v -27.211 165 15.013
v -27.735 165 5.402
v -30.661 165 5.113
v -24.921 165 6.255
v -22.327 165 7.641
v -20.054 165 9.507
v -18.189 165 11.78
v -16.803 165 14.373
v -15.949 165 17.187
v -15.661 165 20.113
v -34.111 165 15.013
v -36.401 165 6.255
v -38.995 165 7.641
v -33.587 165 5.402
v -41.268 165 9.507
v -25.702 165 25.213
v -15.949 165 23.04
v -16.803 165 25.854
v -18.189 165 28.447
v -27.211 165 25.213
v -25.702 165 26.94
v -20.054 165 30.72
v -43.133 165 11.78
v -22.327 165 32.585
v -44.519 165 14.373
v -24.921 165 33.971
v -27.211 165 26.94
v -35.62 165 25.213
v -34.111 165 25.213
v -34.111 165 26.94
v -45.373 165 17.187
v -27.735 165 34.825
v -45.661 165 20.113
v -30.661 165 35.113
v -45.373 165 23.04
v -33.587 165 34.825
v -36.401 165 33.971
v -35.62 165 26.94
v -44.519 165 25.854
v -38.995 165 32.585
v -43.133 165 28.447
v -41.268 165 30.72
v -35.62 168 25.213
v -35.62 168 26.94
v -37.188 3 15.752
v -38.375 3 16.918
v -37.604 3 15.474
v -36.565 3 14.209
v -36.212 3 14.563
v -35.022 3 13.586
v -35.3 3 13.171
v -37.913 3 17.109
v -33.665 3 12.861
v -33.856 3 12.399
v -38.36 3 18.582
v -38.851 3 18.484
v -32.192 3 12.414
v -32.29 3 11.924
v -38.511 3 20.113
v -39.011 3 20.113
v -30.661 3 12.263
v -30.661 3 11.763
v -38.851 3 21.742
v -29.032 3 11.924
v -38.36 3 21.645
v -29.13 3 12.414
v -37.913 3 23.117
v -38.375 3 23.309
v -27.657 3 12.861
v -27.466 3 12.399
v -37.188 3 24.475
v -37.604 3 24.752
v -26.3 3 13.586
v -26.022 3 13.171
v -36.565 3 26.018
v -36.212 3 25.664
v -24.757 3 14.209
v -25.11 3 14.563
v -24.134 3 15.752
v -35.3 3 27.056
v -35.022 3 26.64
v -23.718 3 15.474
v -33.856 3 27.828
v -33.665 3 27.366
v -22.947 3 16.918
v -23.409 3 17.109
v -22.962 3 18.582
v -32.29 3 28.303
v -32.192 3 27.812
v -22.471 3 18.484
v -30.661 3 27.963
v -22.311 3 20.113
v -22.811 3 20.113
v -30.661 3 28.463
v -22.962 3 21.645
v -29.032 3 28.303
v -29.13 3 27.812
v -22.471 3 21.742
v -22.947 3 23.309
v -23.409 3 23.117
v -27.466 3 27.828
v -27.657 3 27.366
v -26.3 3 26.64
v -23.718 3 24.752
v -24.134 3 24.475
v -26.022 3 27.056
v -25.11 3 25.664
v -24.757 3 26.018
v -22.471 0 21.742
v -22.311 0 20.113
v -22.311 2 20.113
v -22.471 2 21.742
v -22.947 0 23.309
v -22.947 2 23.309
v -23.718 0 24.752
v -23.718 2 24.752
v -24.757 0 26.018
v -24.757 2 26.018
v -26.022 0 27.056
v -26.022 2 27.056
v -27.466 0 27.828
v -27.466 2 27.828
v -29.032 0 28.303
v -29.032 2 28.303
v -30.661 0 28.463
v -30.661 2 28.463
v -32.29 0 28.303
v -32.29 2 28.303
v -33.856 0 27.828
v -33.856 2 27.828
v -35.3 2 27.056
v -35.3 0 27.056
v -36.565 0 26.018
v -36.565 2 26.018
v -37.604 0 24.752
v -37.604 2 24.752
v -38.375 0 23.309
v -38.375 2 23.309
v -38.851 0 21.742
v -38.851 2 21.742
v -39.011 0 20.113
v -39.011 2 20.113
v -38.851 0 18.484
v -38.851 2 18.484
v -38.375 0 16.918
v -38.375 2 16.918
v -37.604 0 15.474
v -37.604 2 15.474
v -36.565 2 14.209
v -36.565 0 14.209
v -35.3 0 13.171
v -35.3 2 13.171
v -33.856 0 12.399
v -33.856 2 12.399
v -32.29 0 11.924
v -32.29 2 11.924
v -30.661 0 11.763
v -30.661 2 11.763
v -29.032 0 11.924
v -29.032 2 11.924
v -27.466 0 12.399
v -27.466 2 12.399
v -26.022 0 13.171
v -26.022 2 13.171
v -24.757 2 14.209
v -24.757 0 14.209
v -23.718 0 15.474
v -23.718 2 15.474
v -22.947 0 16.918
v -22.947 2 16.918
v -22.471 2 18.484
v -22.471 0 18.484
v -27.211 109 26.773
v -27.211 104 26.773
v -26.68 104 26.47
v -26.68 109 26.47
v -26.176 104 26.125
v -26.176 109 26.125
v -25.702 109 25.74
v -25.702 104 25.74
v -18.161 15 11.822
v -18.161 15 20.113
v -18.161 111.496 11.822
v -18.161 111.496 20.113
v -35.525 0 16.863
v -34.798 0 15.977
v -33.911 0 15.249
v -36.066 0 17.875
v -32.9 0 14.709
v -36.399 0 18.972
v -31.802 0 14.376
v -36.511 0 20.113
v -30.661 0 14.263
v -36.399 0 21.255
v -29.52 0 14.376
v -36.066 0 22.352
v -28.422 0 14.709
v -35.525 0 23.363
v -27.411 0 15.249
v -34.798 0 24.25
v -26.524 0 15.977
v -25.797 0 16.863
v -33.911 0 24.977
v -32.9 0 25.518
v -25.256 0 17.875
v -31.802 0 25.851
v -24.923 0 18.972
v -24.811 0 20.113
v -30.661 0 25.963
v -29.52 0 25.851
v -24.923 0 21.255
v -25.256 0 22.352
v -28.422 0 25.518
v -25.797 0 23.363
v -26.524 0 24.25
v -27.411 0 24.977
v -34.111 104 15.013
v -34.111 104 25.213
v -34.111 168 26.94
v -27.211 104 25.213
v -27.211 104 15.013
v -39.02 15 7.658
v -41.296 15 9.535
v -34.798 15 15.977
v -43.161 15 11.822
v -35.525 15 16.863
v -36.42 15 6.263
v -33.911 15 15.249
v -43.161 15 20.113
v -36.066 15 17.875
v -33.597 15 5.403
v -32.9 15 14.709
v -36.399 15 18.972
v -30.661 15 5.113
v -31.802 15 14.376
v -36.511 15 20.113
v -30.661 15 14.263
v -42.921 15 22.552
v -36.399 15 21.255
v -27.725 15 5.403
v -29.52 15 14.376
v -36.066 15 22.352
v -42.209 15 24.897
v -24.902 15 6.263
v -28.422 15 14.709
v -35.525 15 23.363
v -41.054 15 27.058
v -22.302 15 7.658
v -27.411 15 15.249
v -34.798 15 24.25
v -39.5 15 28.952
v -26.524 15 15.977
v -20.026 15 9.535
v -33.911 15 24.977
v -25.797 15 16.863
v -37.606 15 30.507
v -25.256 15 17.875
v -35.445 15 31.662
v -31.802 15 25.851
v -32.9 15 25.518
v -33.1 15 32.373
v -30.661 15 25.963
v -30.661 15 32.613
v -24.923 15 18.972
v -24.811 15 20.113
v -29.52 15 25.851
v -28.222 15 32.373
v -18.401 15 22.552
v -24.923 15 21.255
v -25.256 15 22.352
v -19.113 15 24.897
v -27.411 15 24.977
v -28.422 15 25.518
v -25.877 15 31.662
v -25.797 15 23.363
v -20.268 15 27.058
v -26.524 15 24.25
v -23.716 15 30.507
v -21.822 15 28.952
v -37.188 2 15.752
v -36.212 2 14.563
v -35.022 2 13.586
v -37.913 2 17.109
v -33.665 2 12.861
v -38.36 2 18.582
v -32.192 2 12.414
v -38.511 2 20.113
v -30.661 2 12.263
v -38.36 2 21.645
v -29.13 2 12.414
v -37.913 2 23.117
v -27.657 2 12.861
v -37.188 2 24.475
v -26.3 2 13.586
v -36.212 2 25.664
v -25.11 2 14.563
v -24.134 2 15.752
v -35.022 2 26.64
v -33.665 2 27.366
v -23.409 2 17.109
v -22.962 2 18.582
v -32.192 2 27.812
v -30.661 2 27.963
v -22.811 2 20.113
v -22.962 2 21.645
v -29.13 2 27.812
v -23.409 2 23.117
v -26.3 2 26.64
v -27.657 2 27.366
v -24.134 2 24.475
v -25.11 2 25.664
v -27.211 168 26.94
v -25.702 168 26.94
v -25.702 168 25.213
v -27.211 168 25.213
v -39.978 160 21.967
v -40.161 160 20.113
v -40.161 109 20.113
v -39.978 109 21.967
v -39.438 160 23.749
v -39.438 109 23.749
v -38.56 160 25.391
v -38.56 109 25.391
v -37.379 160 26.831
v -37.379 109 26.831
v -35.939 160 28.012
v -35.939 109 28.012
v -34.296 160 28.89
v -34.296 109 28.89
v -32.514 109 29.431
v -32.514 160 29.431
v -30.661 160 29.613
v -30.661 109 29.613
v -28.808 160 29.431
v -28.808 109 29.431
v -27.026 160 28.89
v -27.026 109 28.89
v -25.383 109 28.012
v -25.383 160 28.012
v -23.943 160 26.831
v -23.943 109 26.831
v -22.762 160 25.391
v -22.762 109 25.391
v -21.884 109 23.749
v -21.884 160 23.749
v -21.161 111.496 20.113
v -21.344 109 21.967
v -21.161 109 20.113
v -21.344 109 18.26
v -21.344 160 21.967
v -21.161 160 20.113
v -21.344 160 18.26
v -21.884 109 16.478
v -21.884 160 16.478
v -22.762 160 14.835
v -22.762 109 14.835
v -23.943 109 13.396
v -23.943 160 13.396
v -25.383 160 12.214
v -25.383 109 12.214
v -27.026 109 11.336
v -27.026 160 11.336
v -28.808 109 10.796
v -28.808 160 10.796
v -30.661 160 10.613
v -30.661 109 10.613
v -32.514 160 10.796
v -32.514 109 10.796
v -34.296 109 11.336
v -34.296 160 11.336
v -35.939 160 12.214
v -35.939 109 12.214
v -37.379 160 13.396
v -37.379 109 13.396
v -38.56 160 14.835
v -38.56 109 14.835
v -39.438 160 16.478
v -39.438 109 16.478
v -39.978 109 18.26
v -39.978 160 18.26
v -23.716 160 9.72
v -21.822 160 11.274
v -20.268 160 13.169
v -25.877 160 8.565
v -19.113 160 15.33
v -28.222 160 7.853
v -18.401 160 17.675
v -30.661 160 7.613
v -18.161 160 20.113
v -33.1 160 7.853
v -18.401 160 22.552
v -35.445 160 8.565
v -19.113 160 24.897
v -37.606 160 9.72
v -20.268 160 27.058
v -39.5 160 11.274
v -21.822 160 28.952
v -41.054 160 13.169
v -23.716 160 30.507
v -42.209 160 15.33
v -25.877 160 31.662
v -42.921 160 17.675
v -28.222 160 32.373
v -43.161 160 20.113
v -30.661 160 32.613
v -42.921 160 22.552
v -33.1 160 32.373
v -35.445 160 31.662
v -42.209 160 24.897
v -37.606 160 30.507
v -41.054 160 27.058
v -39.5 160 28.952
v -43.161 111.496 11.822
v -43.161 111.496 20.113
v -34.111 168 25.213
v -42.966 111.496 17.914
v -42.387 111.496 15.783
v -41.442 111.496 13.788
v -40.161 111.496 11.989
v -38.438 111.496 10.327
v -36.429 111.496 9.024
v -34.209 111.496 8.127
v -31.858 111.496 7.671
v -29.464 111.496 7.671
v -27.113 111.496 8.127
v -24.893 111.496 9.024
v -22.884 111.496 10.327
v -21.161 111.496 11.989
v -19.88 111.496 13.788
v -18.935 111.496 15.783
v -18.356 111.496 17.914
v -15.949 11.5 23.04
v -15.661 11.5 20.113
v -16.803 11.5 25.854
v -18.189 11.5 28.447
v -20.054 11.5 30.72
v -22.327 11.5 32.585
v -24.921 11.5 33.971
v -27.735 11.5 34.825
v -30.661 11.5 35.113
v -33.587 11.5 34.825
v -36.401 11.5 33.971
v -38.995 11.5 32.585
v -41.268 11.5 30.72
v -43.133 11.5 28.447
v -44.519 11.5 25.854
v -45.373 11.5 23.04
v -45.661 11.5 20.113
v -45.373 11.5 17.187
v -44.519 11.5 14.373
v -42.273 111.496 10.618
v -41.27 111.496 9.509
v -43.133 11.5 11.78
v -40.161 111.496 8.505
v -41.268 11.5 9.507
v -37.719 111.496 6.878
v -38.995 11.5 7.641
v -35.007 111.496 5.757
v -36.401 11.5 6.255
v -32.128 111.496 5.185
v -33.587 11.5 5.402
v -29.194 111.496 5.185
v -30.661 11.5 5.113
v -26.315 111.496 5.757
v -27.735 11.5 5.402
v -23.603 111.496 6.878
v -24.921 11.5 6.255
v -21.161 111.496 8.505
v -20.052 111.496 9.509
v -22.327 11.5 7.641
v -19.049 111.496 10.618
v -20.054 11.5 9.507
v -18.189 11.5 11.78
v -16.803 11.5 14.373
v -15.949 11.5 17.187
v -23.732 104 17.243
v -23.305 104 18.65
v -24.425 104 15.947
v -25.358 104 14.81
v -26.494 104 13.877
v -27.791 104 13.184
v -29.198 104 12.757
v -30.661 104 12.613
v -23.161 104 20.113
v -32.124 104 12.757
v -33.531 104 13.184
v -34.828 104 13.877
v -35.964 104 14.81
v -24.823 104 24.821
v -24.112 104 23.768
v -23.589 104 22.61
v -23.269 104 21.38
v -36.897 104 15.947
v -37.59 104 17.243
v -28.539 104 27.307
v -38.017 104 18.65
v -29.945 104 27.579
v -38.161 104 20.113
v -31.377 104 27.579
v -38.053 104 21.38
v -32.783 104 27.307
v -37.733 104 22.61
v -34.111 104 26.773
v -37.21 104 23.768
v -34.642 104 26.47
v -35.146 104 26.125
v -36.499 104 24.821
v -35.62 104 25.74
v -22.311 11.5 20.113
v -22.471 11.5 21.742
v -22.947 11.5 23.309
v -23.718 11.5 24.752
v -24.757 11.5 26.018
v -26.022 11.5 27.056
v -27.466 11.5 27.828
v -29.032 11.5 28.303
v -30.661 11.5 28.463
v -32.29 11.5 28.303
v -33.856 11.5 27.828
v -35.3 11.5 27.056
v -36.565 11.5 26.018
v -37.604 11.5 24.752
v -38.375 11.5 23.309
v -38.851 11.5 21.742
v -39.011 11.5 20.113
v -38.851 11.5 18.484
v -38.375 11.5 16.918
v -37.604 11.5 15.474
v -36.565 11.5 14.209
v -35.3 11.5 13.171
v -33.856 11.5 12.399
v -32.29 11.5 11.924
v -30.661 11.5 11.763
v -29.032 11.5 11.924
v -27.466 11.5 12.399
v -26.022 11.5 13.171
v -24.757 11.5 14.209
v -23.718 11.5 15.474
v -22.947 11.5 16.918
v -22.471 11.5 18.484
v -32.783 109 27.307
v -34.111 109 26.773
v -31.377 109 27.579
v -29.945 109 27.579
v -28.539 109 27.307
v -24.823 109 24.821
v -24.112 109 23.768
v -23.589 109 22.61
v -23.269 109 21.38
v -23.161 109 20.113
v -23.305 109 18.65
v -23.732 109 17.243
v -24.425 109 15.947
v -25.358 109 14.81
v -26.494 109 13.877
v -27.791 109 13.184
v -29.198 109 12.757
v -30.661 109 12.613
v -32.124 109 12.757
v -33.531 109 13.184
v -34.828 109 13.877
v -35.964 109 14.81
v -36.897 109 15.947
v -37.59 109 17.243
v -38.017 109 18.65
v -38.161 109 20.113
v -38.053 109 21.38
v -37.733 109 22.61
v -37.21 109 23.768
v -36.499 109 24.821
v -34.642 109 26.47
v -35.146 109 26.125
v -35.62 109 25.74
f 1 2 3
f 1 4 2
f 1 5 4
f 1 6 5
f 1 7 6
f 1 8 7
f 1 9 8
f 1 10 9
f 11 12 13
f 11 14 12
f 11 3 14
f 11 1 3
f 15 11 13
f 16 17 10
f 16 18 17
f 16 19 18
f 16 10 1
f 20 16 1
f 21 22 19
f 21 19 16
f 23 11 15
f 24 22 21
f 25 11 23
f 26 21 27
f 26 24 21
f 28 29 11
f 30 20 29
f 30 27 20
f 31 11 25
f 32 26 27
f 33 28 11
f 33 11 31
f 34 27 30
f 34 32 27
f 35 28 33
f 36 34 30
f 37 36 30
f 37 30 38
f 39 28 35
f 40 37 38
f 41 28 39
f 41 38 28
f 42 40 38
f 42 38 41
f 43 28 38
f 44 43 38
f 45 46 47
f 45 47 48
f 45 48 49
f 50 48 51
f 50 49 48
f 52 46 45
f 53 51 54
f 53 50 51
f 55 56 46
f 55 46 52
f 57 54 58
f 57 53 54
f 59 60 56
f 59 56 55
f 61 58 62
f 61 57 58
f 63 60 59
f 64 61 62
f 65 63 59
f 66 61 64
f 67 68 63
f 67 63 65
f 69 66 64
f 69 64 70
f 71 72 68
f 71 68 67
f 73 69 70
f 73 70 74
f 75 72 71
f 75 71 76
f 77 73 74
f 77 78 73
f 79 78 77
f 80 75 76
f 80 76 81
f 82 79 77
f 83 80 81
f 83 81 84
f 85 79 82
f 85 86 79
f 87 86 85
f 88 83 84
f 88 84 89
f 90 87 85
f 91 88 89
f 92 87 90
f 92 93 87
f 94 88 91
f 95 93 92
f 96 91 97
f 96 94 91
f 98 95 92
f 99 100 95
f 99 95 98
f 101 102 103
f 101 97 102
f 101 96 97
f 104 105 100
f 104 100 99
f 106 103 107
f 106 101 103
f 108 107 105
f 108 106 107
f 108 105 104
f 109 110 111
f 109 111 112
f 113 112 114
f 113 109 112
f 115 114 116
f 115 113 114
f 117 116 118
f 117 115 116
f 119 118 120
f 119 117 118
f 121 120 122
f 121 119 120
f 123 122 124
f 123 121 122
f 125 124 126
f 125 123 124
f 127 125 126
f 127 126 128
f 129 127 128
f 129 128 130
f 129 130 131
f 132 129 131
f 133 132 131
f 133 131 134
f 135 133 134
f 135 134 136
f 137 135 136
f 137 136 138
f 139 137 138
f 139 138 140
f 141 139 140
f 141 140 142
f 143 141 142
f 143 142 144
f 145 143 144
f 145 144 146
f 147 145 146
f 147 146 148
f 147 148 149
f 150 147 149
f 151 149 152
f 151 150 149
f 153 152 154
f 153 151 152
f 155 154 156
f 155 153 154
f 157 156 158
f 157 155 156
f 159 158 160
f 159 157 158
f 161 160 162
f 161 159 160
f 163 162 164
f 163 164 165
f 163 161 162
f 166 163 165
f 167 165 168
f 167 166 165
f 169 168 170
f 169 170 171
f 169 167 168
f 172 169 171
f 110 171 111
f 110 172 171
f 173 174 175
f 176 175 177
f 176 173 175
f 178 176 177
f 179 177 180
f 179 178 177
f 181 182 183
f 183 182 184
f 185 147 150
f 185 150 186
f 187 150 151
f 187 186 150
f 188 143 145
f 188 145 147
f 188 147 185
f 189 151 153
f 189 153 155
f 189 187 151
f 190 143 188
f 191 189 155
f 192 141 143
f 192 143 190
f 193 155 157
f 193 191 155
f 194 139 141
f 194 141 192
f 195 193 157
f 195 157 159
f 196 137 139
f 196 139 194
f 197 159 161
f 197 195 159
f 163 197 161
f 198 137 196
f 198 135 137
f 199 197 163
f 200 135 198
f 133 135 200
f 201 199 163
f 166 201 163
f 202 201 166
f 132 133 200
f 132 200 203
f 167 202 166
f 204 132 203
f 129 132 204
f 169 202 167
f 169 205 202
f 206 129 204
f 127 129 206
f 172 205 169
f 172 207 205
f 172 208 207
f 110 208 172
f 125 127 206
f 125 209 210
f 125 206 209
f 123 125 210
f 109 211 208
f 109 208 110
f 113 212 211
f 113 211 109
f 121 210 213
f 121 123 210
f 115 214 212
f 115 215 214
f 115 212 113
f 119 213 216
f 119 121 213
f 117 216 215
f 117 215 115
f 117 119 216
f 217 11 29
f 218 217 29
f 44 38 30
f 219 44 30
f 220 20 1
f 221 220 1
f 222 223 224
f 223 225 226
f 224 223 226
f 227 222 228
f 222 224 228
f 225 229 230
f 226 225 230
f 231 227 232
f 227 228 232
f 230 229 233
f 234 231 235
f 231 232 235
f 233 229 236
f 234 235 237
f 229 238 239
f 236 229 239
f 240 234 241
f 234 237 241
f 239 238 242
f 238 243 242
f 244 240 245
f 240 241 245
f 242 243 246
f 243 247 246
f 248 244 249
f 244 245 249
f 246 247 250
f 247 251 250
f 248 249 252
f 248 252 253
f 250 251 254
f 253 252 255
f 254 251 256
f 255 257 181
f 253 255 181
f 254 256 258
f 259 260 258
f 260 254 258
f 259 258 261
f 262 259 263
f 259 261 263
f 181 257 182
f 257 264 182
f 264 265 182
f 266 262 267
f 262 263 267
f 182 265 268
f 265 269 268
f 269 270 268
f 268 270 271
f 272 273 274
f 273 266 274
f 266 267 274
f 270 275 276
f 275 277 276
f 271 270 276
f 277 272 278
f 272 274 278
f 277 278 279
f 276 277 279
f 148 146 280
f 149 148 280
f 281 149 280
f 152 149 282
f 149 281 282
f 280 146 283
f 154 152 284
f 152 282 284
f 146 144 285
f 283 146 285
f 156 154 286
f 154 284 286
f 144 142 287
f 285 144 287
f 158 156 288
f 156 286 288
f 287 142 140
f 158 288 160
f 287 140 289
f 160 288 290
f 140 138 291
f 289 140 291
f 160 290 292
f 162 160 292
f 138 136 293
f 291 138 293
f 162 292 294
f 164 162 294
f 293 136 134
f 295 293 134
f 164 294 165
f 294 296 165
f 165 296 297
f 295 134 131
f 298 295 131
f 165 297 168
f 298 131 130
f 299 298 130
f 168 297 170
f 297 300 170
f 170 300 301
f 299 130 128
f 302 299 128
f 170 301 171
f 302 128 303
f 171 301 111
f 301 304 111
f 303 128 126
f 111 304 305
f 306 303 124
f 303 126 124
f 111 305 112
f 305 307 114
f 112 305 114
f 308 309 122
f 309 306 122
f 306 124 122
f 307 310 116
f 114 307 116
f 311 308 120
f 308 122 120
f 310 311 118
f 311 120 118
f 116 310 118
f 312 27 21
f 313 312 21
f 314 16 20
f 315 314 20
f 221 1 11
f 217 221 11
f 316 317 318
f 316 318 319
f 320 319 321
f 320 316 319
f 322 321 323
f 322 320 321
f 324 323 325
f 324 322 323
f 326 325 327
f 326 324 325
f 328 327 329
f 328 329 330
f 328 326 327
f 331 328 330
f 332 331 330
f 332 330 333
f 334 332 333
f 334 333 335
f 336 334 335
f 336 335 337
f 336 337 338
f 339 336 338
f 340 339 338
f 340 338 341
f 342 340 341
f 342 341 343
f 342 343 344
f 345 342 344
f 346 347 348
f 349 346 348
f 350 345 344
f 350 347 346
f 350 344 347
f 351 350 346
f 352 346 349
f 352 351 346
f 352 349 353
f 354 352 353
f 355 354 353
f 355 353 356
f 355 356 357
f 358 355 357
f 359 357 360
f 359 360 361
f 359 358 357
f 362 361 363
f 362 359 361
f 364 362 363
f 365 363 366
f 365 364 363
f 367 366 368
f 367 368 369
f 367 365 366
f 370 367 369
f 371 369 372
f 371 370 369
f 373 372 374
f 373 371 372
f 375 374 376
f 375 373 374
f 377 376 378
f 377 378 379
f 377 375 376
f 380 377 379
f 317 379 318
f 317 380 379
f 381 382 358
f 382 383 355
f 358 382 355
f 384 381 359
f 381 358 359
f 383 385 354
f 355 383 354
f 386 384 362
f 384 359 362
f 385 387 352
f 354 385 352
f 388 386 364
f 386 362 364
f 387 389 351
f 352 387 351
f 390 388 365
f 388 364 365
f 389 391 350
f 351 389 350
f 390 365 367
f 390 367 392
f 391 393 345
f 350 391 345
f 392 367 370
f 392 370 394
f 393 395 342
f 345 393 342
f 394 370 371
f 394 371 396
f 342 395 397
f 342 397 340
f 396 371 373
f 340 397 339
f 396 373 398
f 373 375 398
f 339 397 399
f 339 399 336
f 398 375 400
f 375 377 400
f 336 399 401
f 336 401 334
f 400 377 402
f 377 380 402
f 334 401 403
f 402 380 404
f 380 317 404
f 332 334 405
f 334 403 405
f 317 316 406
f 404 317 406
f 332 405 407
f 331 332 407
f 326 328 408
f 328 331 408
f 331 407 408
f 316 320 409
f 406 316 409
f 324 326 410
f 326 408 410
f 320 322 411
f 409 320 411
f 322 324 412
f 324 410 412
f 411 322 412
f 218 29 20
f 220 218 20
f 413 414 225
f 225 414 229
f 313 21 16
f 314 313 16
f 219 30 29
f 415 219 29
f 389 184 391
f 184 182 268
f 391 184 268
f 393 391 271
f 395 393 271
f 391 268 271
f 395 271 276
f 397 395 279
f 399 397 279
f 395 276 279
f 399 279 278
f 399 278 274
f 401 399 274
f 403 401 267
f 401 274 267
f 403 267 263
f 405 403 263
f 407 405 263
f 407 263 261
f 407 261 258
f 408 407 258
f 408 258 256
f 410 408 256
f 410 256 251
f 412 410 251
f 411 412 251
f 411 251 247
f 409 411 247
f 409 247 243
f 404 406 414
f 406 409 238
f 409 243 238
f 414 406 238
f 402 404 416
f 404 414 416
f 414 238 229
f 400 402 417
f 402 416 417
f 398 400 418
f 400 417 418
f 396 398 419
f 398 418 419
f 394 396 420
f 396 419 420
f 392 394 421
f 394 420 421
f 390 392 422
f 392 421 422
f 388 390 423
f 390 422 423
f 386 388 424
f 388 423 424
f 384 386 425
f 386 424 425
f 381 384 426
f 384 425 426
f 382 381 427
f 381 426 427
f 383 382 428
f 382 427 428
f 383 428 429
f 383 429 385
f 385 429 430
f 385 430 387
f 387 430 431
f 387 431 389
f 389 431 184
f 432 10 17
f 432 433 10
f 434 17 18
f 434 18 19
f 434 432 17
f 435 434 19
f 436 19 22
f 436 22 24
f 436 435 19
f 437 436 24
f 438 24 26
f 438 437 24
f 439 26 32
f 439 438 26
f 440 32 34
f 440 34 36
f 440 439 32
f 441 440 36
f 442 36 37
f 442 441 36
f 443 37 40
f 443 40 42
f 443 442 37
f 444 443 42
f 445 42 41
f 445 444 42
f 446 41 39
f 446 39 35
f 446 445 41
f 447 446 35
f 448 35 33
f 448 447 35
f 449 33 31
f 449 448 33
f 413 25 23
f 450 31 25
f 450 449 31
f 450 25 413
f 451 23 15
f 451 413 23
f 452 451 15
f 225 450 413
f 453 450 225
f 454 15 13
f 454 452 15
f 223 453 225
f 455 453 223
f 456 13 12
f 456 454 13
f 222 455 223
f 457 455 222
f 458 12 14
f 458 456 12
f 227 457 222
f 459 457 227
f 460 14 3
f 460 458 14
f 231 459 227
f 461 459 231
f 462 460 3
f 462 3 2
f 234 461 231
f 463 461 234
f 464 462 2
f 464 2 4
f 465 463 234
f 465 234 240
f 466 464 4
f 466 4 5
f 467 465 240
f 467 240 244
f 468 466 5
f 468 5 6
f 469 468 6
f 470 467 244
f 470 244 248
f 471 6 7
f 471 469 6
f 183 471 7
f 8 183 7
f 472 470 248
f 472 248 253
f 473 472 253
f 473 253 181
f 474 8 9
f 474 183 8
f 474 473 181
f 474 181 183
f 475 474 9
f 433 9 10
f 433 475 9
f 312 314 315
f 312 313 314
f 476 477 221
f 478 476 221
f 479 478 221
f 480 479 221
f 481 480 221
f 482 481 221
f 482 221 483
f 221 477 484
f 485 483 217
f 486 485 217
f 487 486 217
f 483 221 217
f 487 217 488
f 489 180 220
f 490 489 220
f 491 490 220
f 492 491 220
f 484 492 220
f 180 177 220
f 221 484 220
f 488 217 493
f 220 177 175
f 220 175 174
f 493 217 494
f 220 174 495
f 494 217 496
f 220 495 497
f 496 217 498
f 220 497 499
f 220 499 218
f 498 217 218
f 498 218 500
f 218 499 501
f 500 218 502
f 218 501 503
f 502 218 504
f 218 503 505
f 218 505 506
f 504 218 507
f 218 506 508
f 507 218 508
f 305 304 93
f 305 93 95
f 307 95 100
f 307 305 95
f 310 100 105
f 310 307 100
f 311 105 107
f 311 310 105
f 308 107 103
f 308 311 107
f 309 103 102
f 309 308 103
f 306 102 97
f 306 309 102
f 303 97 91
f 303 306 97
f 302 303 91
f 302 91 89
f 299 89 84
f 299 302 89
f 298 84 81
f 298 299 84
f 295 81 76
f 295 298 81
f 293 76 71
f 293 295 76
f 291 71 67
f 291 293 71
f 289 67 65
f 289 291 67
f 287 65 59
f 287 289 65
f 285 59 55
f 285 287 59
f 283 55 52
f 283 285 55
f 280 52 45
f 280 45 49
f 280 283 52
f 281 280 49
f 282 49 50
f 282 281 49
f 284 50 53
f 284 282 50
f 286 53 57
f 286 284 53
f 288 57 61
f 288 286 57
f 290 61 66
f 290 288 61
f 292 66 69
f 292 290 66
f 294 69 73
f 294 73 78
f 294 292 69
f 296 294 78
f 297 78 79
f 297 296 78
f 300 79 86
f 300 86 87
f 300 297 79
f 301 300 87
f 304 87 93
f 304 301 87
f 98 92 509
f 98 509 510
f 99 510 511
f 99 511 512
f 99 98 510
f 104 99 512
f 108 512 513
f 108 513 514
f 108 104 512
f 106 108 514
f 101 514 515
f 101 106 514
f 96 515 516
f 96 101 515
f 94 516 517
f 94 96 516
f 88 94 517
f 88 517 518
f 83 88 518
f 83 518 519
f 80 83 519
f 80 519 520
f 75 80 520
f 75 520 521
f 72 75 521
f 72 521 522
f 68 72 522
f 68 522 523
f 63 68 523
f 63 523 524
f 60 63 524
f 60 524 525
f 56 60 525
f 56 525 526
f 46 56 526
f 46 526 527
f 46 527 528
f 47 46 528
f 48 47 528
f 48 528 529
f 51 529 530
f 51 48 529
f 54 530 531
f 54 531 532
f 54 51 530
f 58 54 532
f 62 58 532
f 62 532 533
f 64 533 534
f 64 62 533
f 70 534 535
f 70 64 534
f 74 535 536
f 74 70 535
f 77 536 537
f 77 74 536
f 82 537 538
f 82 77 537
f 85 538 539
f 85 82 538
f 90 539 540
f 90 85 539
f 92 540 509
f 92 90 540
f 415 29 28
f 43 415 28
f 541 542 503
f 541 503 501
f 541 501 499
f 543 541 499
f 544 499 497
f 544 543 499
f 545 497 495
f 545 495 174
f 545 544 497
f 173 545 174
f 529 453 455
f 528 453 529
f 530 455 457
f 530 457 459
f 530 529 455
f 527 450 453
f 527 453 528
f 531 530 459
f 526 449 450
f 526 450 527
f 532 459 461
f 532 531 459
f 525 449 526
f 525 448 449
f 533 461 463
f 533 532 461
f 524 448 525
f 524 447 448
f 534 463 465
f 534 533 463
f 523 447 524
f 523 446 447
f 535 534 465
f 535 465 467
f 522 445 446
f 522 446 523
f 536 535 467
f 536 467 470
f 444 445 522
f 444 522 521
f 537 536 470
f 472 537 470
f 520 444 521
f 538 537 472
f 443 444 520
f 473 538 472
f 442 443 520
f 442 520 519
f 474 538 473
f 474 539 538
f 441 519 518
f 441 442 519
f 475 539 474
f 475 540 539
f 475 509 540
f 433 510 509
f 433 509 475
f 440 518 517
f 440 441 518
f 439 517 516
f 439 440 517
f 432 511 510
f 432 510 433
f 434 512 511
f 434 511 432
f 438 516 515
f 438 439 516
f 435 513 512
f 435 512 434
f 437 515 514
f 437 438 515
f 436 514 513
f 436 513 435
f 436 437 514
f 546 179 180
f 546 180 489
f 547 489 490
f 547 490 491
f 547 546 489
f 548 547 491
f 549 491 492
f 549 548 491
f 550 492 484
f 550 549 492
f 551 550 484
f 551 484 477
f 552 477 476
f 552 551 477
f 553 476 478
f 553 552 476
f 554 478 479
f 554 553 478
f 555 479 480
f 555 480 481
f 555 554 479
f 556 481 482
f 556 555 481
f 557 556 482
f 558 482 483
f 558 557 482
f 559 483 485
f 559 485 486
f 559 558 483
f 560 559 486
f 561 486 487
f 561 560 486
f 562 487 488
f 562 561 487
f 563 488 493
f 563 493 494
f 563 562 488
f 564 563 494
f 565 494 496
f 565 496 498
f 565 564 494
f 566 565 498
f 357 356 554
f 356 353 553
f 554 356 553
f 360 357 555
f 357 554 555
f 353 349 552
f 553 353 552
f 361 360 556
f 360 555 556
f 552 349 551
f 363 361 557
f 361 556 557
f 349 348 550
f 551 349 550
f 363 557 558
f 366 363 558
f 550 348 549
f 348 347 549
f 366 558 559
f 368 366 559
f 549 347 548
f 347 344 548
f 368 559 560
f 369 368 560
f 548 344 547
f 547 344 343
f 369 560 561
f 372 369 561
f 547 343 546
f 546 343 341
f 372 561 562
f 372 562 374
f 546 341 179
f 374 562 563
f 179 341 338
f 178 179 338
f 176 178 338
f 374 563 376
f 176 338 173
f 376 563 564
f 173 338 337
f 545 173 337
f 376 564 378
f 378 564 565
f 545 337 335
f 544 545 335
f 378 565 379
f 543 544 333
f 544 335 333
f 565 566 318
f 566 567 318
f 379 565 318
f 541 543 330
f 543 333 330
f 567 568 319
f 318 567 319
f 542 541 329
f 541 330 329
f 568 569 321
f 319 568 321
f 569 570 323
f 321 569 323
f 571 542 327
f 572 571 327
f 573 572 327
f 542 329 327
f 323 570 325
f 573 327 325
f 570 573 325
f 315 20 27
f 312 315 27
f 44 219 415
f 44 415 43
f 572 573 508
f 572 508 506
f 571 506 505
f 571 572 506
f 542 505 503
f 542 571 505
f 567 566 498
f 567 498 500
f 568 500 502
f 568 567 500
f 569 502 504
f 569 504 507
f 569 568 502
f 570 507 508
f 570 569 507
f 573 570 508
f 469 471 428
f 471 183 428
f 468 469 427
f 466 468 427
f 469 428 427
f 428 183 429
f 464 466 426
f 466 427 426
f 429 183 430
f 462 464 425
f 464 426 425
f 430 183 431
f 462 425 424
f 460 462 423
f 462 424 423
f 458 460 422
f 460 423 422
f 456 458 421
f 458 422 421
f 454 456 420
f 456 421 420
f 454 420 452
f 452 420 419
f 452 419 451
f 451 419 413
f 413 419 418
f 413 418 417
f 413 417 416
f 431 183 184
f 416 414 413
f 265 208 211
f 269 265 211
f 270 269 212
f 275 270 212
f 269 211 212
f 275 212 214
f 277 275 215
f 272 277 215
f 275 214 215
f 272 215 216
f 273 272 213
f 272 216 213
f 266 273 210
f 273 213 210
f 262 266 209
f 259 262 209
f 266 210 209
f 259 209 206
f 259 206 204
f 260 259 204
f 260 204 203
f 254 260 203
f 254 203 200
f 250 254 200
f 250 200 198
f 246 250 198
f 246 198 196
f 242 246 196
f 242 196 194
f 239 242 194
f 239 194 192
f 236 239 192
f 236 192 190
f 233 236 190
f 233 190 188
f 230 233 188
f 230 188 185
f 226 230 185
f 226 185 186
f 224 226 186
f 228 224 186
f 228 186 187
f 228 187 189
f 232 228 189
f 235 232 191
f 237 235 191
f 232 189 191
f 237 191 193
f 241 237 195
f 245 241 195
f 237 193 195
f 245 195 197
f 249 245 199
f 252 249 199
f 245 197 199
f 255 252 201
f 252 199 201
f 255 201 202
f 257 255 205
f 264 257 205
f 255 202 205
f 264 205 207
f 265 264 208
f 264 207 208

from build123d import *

# Parameters (mm, degrees)
F0_R      = 8.35
F0_R_2    = 5.85
F1_DEPTH  = 15
F2_START  = -11.5
F0_R_3    = 15
F0_R_4    = 12.5
F2_DEPTH  = 3.5
F3_START  = -15
F3_DEPTH  = 150
F4_R      = 15
F4_R_2    = 12.5
F5_DEPTH  = 5
F7_START  = -5
F7_DEPTH  = 51
F8_DEPTH  = 61
F6_W      = 2.95
F6_H      = 4.6
F9_DEPTH  = 15.5
F12_DEPTH = 25
F14_DEPTH = 18.0629715323
F15_DEPTH = 3
F17_START = -2
F16_R     = 8.35
F16_R_2   = 7.85
F17_DEPTH = 1


with BuildPart() as f1:
    # F0 (on Front) → F1 (new body)
    with BuildSketch(Plane.XZ):
        with Locations((-30.6610018015, 20.1133023947)):
            Circle(F0_R)
        with Locations((-30.6610018015, 20.1133023947)):
            Circle(F0_R_2, mode=Mode.SUBTRACT)
    extrude(amount=-F1_DEPTH)

    # F0 (on Front) → F2 (join)
    with BuildSketch(Plane.XZ.offset(F2_START)):
        with Locations((-30.6610018015, 20.1133023947)):
            Circle(F0_R_3)
        with Locations((-30.6610018015, 20.1133023947)):
            Circle(F0_R_4, mode=Mode.SUBTRACT)
        with Locations((-30.6610018015, 20.1133023947)):
            Circle(F0_R_4)
        with Locations((-30.6610018015, 20.1133023947)):
            Circle(F0_R, mode=Mode.SUBTRACT)
    extrude(amount=-F2_DEPTH)

    # F0 (on Front) → F3 (join)
    with BuildSketch(Plane.XZ.offset(F3_START)):
        with Locations((-30.6610018015, 20.1133023947)):
            Circle(F0_R_3)
        with Locations((-30.6610018015, 20.1133023947)):
            Circle(F0_R_4, mode=Mode.SUBTRACT)
    extrude(amount=-F3_DEPTH)

    # F4 (on face) → F5 (join)
    with BuildSketch(Plane(origin=(0, 165, 0), x_dir=(-1, 0, 0), z_dir=(0, 1, 0))):
        with Locations((30.6610018015, 20.1133023947)):
            Circle(F4_R)
        with Locations((30.6610018015, 20.1133023947)):
            Circle(F4_R_2, mode=Mode.SUBTRACT)
        with Locations((30.6610018015, 20.1133023947)):
            Circle(F4_R_2)
    extrude(amount=-F5_DEPTH)

    # F6 (on face) → F7 (join)
    with BuildSketch(Plane(origin=(0, 165, 0), x_dir=(-1, 0, 0), z_dir=(0, 1, 0)).offset(F7_START)):
        with BuildLine():
            Line((38.1610018015, 20.1133023947), (40.1610018015, 20.1133023947))
            ThreePointArc((40.1610018015, 20.1133023947), (30.6610018015, 29.6133023947), (21.1610018015, 20.1133023947))
            Line((21.1610018015, 20.1133023947), (23.1610018015, 20.1133023947))
            ThreePointArc((23.1610018015, 20.1133023947), (23.8256071477, 23.1999478111), (25.7016364485, 25.7395529487))
            Line((25.7016364485, 25.7395529487), (25.7016364485, 26.9397236407))
            Line((25.7016364485, 26.9397236407), (27.2110018015, 26.9397236407))
            Line((27.2110018015, 26.9397236407), (27.2110018015, 26.7726942589))
            ThreePointArc((27.2110018015, 26.7726942589), (30.6610018015, 27.6133023947), (34.1110018015, 26.7726942589))
            Line((34.1110018015, 26.7726942589), (34.1110018015, 26.9397236407))
            Line((34.1110018015, 26.9397236407), (35.6203671545, 26.9397236407))
            Line((35.6203671545, 26.9397236407), (35.6203671545, 25.7395529487))
            ThreePointArc((35.6203671545, 25.7395529487), (37.4963964553, 23.1999478111), (38.1610018015, 20.1133023947))
        make_face()
        with BuildLine():
            ThreePointArc((21.1610018015, 20.1133023947), (30.6610018015, 10.6133023947), (40.1610018015, 20.1133023947))
            Line((40.1610018015, 20.1133023947), (38.1610018015, 20.1133023947))
            ThreePointArc((38.1610018015, 20.1133023947), (30.6610018015, 12.6133023947), (23.1610018015, 20.1133023947))
            Line((23.1610018015, 20.1133023947), (21.1610018015, 20.1133023947))
        make_face()
        with BuildLine():
            Line((25.7016364485, 26.9397236407), (25.7016364485, 25.7395529487))
            ThreePointArc((25.7016364485, 25.7395529487), (26.424706055, 26.3023086436), (27.2110018015, 26.7726942589))
            Line((27.2110018015, 26.7726942589), (27.2110018015, 26.9397236407))
            Line((27.2110018015, 26.9397236407), (25.7016364485, 26.9397236407))
        make_face()
        with BuildLine():
            ThreePointArc((34.1110018015, 26.7726942589), (34.897297548, 26.3023086436), (35.6203671545, 25.7395529487))
            Line((35.6203671545, 25.7395529487), (35.6203671545, 26.9397236407))
            Line((35.6203671545, 26.9397236407), (34.1110018015, 26.9397236407))
            Line((34.1110018015, 26.9397236407), (34.1110018015, 26.7726942589))
        make_face()
    extrude(amount=-F7_DEPTH)

    # F6 (on face) → F8 (join)
    with BuildSketch(Plane(origin=(0, 165, 0), x_dir=(-1, 0, 0), z_dir=(0, 1, 0))):
        with BuildLine():
            Line((34.1110018015, 20.1133023947), (38.1610018015, 20.1133023947))
            ThreePointArc((38.1610018015, 20.1133023947), (37.4963964553, 23.1999478111), (35.6203671545, 25.7395529487))
            Line((35.6203671545, 25.7395529487), (35.6203671545, 25.2133023947))
            Line((35.6203671545, 25.2133023947), (34.1110018015, 25.2133023947))
            Line((34.1110018015, 25.2133023947), (34.1110018015, 20.1133023947))
        make_face()
        with BuildLine():
            Line((35.6203671545, 25.2133023947), (35.6203671545, 25.7395529487))
            ThreePointArc((35.6203671545, 25.7395529487), (34.897297548, 26.3023086436), (34.1110018015, 26.7726942589))
            Line((34.1110018015, 26.7726942589), (34.1110018015, 25.2133023947))
            Line((34.1110018015, 25.2133023947), (35.6203671545, 25.2133023947))
        make_face()
        with BuildLine():
            Line((34.1110018015, 25.2133023947), (34.1110018015, 26.7726942589))
            ThreePointArc((34.1110018015, 26.7726942589), (30.6610018015, 27.6133023947), (27.2110018015, 26.7726942589))
            Line((27.2110018015, 26.7726942589), (27.2110018015, 25.2133023947))
            Line((27.2110018015, 25.2133023947), (30.6610018015, 25.2133023947))
            Line((30.6610018015, 25.2133023947), (34.1110018015, 25.2133023947))
        make_face()
        with BuildLine():
            ThreePointArc((27.2110018015, 26.7726942589), (26.424706055, 26.3023086436), (25.7016364485, 25.7395529487))
            Line((25.7016364485, 25.7395529487), (25.7016364485, 25.2133023947))
            Line((25.7016364485, 25.2133023947), (27.2110018015, 25.2133023947))
            Line((27.2110018015, 25.2133023947), (27.2110018015, 26.7726942589))
        make_face()
        with BuildLine():
            ThreePointArc((25.7016364485, 25.7395529487), (23.8256071477, 23.1999478111), (23.1610018015, 20.1133023947))
            Line((23.1610018015, 20.1133023947), (27.2110018015, 20.1133023947))
            Line((27.2110018015, 20.1133023947), (27.2110018015, 25.2133023947))
            Line((27.2110018015, 25.2133023947), (25.7016364485, 25.2133023947))
            Line((25.7016364485, 25.2133023947), (25.7016364485, 25.7395529487))
        make_face()
        with BuildLine():
            ThreePointArc((23.1610018015, 20.1133023947), (30.6610018015, 12.6133023947), (38.1610018015, 20.1133023947))
            Line((38.1610018015, 20.1133023947), (34.1110018015, 20.1133023947))
            Line((34.1110018015, 20.1133023947), (34.1110018015, 15.0133023947))
            Line((34.1110018015, 15.0133023947), (30.6610018015, 15.0133023947))
            Line((30.6610018015, 15.0133023947), (27.2110018015, 15.0133023947))
            Line((27.2110018015, 15.0133023947), (27.2110018015, 20.1133023947))
            Line((27.2110018015, 20.1133023947), (23.1610018015, 20.1133023947))
        make_face()
    extrude(amount=-F8_DEPTH)

    # F6 (on face) → F9 (cut)
    with BuildSketch(Plane(origin=(0, 165, 0), x_dir=(-1, 0, 0), z_dir=(0, 1, 0))):
        with Locations((32.1360018015, 22.4133023947)):
            Rectangle(F6_W, F6_H)
        Polygon((33.6110018015, 20.1133023947), (34.1110018015, 20.1133023947), (34.1110018015, 25.2133023947), (30.6610018015, 25.2133023947), (27.2110018015, 25.2133023947), (27.2110018015, 20.1133023947), (27.7110018015, 20.1133023947), (27.7110018015, 24.7133023947), (30.6610018015, 24.7133023947), (33.6110018015, 24.7133023947), align=None)
        Polygon((33.6110018015, 15.5133023947), (33.6110018015, 20.1133023947), (30.6610018015, 20.1133023947), (27.7110018015, 20.1133023947), (27.7110018015, 15.5133023947), (30.6610018015, 15.5133023947), align=None)
        with Locations((29.1860018015, 22.4133023947)):
            Rectangle(F6_W, F6_H)
        Polygon((34.1110018015, 15.0133023947), (34.1110018015, 20.1133023947), (33.6110018015, 20.1133023947), (33.6110018015, 15.5133023947), (30.6610018015, 15.5133023947), (27.7110018015, 15.5133023947), (27.7110018015, 20.1133023947), (27.2110018015, 20.1133023947), (27.2110018015, 15.0133023947), (30.6610018015, 15.0133023947), align=None)
    extrude(amount=-F9_DEPTH, mode=Mode.SUBTRACT)

    # F11 (on face) → F12 (cut)
    with BuildSketch(Plane.XY.offset(20.1133023947)):
        Polygon((-43.1610018015, 15), (-18.1610018015, 15), (-18.1610018015, 111.4961504936), (-21.1610018015, 111.4961504936), (-21.1610018015, 93.4331789613), (-40.1610018015, 93.4331789613), (-40.1610018015, 111.4961504936), (-43.1610018015, 111.4961504936), align=None)
    extrude(amount=-F12_DEPTH, mode=Mode.SUBTRACT)

    # F13 (on face) → F14 (cut, through all)
    with BuildSketch(Plane.XZ.offset(-93.4331789613)):
        with BuildLine():
            Line((-40.1610018015, 11.9892639901), (-40.1610018015, 8.5051156285))
            ThreePointArc((-40.1610018015, 8.5051156285), (-30.6610018015, 5.1133023947), (-21.1610018015, 8.5051156285))
            Line((-21.1610018015, 8.5051156285), (-21.1610018015, 11.9892639901))
            ThreePointArc((-21.1610018015, 11.9892639901), (-30.6610018015, 7.6133023947), (-40.1610018015, 11.9892639901))
        make_face()
    extrude(amount=-F14_DEPTH, mode=Mode.SUBTRACT)

    # F6 (on face) → F15 (join)
    with BuildSketch(Plane(origin=(0, 165, 0), x_dir=(-1, 0, 0), z_dir=(0, 1, 0))):
        with BuildLine():
            ThreePointArc((27.2110018015, 26.7726942589), (26.424706055, 26.3023086436), (25.7016364485, 25.7395529487))
            Line((25.7016364485, 25.7395529487), (25.7016364485, 25.2133023947))
            Line((25.7016364485, 25.2133023947), (27.2110018015, 25.2133023947))
            Line((27.2110018015, 25.2133023947), (27.2110018015, 26.7726942589))
        make_face()
        with BuildLine():
            Line((25.7016364485, 26.9397236407), (25.7016364485, 25.7395529487))
            ThreePointArc((25.7016364485, 25.7395529487), (26.424706055, 26.3023086436), (27.2110018015, 26.7726942589))
            Line((27.2110018015, 26.7726942589), (27.2110018015, 26.9397236407))
            Line((27.2110018015, 26.9397236407), (25.7016364485, 26.9397236407))
        make_face()
        with BuildLine():
            Line((35.6203671545, 25.2133023947), (35.6203671545, 25.7395529487))
            ThreePointArc((35.6203671545, 25.7395529487), (34.897297548, 26.3023086436), (34.1110018015, 26.7726942589))
            Line((34.1110018015, 26.7726942589), (34.1110018015, 25.2133023947))
            Line((34.1110018015, 25.2133023947), (35.6203671545, 25.2133023947))
        make_face()
        with BuildLine():
            ThreePointArc((34.1110018015, 26.7726942589), (34.897297548, 26.3023086436), (35.6203671545, 25.7395529487))
            Line((35.6203671545, 25.7395529487), (35.6203671545, 26.9397236407))
            Line((35.6203671545, 26.9397236407), (34.1110018015, 26.9397236407))
            Line((34.1110018015, 26.9397236407), (34.1110018015, 26.7726942589))
        make_face()
    extrude(amount=F15_DEPTH)

    # F16 (on face) → F17 (cut)
    with BuildSketch(Plane.XZ.offset(F17_START)):
        with Locations((-30.6610018015, 20.1133023947)):
            Circle(F16_R)
        with Locations((-30.6610018015, 20.1133023947)):
            Circle(F16_R_2, mode=Mode.SUBTRACT)
    extrude(amount=-F17_DEPTH, mode=Mode.SUBTRACT)


solid = f1.part
